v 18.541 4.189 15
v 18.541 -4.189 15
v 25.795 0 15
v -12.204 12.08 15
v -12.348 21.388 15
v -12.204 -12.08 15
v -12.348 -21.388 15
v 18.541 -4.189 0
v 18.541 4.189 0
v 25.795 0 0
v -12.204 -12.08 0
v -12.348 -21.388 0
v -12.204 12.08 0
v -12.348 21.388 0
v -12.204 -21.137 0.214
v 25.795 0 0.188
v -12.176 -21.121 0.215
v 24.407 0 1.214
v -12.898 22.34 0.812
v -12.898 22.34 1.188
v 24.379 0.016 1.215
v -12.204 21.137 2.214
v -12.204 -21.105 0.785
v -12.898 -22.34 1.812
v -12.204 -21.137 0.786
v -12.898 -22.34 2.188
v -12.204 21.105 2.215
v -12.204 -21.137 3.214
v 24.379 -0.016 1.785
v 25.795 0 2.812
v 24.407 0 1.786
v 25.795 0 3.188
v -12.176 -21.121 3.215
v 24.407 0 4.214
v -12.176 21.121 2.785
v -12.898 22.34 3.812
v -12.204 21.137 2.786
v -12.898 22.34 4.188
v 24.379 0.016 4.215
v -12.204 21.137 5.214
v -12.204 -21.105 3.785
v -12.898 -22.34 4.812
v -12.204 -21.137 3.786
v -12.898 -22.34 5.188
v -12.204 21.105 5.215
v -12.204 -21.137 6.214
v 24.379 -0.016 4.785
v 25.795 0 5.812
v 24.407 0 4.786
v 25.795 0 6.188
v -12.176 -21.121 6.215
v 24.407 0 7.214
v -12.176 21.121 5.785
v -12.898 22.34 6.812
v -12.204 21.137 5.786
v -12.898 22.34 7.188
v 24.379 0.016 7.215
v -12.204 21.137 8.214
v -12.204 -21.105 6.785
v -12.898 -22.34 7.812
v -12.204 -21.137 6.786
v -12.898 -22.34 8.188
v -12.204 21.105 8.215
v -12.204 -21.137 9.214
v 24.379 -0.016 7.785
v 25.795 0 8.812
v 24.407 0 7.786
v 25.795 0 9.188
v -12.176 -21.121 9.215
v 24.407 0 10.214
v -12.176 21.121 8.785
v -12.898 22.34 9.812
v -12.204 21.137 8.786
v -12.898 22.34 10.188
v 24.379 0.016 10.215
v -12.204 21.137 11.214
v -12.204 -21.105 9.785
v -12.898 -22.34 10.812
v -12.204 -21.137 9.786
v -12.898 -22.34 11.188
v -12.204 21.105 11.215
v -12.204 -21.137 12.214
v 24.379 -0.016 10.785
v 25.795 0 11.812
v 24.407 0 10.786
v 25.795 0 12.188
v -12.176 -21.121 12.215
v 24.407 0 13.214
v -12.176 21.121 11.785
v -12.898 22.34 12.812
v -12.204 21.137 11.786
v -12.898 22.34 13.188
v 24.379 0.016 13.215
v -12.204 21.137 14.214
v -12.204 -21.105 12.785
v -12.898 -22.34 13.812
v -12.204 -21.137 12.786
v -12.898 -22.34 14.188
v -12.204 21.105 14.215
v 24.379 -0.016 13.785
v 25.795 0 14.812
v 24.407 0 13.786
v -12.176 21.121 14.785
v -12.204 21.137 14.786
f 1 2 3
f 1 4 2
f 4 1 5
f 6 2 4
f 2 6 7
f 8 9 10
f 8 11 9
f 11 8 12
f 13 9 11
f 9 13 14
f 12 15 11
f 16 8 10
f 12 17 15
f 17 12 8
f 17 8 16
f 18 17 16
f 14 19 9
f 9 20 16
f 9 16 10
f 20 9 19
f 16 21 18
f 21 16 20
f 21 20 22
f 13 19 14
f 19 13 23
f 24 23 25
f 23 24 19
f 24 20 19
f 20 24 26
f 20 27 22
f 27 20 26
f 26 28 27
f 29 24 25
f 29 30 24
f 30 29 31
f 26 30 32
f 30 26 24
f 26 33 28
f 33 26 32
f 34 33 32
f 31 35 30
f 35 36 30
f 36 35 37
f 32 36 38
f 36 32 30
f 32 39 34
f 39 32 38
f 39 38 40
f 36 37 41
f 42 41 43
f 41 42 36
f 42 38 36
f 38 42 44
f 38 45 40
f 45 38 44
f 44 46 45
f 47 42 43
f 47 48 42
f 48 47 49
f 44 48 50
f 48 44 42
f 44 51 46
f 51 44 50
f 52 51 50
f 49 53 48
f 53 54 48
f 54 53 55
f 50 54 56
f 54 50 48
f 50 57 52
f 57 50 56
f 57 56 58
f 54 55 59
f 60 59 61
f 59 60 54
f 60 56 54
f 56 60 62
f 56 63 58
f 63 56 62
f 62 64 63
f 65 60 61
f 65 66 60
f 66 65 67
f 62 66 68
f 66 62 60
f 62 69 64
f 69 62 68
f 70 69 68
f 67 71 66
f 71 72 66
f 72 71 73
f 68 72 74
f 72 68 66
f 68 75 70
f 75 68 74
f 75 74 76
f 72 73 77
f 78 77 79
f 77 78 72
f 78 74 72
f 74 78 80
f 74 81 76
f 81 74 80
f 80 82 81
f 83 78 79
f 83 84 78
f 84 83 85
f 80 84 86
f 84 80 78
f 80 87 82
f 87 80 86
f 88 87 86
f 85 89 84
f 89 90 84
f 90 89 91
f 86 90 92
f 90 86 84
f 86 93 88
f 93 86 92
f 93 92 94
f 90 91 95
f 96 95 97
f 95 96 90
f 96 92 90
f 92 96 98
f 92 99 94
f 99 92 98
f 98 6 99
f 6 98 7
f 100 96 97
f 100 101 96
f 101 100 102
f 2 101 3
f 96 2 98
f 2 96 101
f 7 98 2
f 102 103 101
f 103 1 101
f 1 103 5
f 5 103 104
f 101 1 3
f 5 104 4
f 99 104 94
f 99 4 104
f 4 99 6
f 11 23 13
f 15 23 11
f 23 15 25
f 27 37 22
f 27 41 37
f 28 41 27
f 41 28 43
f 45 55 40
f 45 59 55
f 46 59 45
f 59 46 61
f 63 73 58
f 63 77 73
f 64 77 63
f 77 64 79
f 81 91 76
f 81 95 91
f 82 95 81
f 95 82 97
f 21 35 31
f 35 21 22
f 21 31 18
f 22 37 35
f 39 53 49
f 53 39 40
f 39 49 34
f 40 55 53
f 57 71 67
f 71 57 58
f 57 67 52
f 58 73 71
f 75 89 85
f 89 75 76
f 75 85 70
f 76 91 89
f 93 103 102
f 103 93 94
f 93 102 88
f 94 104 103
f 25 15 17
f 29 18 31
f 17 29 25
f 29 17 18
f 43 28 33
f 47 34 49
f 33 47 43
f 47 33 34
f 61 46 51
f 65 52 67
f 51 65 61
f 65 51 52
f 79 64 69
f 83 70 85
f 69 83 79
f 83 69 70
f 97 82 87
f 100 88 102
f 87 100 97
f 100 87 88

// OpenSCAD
function _ringPoints(param) = len(param[0]);
function _ringValue(param,point) = param[0][point];
function _numTurns(param) = param[2];
function _numRings(param) = 1+_numTurns(param)*$fn;
function _radius(param) = param[1];
function _lead(param) = param[3];

extrNudge = 0.001;

function extrPoints(param) = 
    let (n=_ringPoints(param),
        r=_radius(param),
        m=_numRings(param),
        l=_lead(param)
        ) 
        [ for (i=[0:m-1]) for (j=[0:n-1]) 
            let (z=i/$fn*l,
                angle=(i%$fn)/$fn*360,
                v=_ringValue(param,j))
            [ (r+v[0])*cos(angle), (r+v[0])*sin(angle),z+v[1]] ];
        
function mod(m,n) = let(mm = m%n) mm<0 ? n+mm : mm;
        
function extrPointIndex(param,ring,point) = 
    let (n=_ringPoints(param)) 
        n*ring + mod(point,n);
        
function startFacePoints(param) = 
    let (n=_ringPoints(param)) 
        [for (i=[0:n-1]) extrPointIndex(param,0,i)];
            
function endFacePoints(param) = 
    let (m=_numRings(param), n=_ringPoints(param)) 
            [for (i=[n-1:-1:0]) extrPointIndex(param,m-1,i)];
                
function tubeFaces(param) =
    let (m=_numRings(param), n=_ringPoints(param))
            [for (i=[0:m-2]) for (j=[0:n-1]) for(tri=[0:1])
                tri==0 ? 
                    [extrPointIndex(param,i,j),extrPointIndex(param,i+1,j),extrPointIndex(param,i,j+1)] :
                    [extrPointIndex(param,i,j+1), extrPointIndex(param,i+1,j),
            extrPointIndex(param,i+1,j+1)]];
                

function extrFaces(param) = concat([startFacePoints(param)],concat(tubeFaces(param),[endFacePoints(param)]));

                    
module rawThread(profile, r=undef, d=undef, height=10, lead=undef, $fn=72, adjustRadius=false) {
    radius = (r==undef ? d/2 : r);
    vSize = max([for(v1=profile) for(v2=profile) v2[1]-v1[1]]);
    vMin = min([for(v=profile) v[0]]);
    radiusAdjustment = adjustRadius ? vMin : 0;
    _lead = lead==undef ? vSize : lead;
    profileScale = vSize <= _lead-extrNudge ? 1 : (_lead-extrNudge)/vSize;
    adjProfile = [for(v=profile) [v[0]-radiusAdjustment,v[1]*profileScale]];
    adjRadius = radius + radiusAdjustment;
    hSize = 1+2*adjRadius + 2*max([for (v=adjProfile) v[0]]);
    numTurns = 2+ceil(height/_lead);
    param = [adjProfile, adjRadius, numTurns, _lead];
    render(convexity=10)
    union() {
        intersection() {
            translate([-hSize/2,-hSize/2,0]) cube([hSize,hSize,height]);
            translate([0,0,-_lead]) polyhedron(faces=extrFaces(param),points=extrPoints(param));
        }
        //rotate([0,0,180/$fn]) 
        cylinder(r=adjRadius+extrNudge,$fn=$fn,h=height);
    }
}

// internal = female
module isoMetricThread(d=undef, r=undef, pitch=1, h=10, lead=undef, angle=30, internal=false, $fn=72) {
    radius = r==undef ? d/2 : r;
    Dmaj = 2*radius;
    H = pitch * cos(angle);
    _lead = lead==undef ? pitch : lead;
    externalReliefRatio=0.03;
    internalReliefRatio=0.057;
    profile = !internal ? 
        [ [-H*externalReliefRatio,(-3/8)*pitch-pitch*externalReliefRatio], /* [0,-(3/8)*pitch], */ 
    [(5/8)*H,-pitch/16],[(5/8)*H,pitch/16], /*[0,(3/8)*pitch],*/
    [-H*externalReliefRatio,(3/8)*pitch+pitch*externalReliefRatio] ] :
        [ [0,-(3/8)*pitch], [(5/8)*H,-pitch/16],[(5/8)*H+H*externalReliefRatio,0],[(5/8)*H,pitch/16],[0,(3/8)*pitch] ];
    Dmin = Dmaj-2*H/4;
    myFN=$fn;
    rawThread(profile,d=Dmin,height=h,lead=_lead,$fn=myFN,adjustRadius=true);        
}

//rawThread([[0,0],[1.5,1.5],[0,3]], r=25, 91, 3);
//rawThread([[0,0],[0,3],[3,3],[3,0]], r=25, 50, 6, $fn=80);
isoMetricThread(d=50,h=15,pitch=3,angle=45,internal=false,$fn=3);
//rawThread([[0,0],[1,0],[.5,.5],[1,1],[0,1]],r=20,h=10,lead=1.5);
